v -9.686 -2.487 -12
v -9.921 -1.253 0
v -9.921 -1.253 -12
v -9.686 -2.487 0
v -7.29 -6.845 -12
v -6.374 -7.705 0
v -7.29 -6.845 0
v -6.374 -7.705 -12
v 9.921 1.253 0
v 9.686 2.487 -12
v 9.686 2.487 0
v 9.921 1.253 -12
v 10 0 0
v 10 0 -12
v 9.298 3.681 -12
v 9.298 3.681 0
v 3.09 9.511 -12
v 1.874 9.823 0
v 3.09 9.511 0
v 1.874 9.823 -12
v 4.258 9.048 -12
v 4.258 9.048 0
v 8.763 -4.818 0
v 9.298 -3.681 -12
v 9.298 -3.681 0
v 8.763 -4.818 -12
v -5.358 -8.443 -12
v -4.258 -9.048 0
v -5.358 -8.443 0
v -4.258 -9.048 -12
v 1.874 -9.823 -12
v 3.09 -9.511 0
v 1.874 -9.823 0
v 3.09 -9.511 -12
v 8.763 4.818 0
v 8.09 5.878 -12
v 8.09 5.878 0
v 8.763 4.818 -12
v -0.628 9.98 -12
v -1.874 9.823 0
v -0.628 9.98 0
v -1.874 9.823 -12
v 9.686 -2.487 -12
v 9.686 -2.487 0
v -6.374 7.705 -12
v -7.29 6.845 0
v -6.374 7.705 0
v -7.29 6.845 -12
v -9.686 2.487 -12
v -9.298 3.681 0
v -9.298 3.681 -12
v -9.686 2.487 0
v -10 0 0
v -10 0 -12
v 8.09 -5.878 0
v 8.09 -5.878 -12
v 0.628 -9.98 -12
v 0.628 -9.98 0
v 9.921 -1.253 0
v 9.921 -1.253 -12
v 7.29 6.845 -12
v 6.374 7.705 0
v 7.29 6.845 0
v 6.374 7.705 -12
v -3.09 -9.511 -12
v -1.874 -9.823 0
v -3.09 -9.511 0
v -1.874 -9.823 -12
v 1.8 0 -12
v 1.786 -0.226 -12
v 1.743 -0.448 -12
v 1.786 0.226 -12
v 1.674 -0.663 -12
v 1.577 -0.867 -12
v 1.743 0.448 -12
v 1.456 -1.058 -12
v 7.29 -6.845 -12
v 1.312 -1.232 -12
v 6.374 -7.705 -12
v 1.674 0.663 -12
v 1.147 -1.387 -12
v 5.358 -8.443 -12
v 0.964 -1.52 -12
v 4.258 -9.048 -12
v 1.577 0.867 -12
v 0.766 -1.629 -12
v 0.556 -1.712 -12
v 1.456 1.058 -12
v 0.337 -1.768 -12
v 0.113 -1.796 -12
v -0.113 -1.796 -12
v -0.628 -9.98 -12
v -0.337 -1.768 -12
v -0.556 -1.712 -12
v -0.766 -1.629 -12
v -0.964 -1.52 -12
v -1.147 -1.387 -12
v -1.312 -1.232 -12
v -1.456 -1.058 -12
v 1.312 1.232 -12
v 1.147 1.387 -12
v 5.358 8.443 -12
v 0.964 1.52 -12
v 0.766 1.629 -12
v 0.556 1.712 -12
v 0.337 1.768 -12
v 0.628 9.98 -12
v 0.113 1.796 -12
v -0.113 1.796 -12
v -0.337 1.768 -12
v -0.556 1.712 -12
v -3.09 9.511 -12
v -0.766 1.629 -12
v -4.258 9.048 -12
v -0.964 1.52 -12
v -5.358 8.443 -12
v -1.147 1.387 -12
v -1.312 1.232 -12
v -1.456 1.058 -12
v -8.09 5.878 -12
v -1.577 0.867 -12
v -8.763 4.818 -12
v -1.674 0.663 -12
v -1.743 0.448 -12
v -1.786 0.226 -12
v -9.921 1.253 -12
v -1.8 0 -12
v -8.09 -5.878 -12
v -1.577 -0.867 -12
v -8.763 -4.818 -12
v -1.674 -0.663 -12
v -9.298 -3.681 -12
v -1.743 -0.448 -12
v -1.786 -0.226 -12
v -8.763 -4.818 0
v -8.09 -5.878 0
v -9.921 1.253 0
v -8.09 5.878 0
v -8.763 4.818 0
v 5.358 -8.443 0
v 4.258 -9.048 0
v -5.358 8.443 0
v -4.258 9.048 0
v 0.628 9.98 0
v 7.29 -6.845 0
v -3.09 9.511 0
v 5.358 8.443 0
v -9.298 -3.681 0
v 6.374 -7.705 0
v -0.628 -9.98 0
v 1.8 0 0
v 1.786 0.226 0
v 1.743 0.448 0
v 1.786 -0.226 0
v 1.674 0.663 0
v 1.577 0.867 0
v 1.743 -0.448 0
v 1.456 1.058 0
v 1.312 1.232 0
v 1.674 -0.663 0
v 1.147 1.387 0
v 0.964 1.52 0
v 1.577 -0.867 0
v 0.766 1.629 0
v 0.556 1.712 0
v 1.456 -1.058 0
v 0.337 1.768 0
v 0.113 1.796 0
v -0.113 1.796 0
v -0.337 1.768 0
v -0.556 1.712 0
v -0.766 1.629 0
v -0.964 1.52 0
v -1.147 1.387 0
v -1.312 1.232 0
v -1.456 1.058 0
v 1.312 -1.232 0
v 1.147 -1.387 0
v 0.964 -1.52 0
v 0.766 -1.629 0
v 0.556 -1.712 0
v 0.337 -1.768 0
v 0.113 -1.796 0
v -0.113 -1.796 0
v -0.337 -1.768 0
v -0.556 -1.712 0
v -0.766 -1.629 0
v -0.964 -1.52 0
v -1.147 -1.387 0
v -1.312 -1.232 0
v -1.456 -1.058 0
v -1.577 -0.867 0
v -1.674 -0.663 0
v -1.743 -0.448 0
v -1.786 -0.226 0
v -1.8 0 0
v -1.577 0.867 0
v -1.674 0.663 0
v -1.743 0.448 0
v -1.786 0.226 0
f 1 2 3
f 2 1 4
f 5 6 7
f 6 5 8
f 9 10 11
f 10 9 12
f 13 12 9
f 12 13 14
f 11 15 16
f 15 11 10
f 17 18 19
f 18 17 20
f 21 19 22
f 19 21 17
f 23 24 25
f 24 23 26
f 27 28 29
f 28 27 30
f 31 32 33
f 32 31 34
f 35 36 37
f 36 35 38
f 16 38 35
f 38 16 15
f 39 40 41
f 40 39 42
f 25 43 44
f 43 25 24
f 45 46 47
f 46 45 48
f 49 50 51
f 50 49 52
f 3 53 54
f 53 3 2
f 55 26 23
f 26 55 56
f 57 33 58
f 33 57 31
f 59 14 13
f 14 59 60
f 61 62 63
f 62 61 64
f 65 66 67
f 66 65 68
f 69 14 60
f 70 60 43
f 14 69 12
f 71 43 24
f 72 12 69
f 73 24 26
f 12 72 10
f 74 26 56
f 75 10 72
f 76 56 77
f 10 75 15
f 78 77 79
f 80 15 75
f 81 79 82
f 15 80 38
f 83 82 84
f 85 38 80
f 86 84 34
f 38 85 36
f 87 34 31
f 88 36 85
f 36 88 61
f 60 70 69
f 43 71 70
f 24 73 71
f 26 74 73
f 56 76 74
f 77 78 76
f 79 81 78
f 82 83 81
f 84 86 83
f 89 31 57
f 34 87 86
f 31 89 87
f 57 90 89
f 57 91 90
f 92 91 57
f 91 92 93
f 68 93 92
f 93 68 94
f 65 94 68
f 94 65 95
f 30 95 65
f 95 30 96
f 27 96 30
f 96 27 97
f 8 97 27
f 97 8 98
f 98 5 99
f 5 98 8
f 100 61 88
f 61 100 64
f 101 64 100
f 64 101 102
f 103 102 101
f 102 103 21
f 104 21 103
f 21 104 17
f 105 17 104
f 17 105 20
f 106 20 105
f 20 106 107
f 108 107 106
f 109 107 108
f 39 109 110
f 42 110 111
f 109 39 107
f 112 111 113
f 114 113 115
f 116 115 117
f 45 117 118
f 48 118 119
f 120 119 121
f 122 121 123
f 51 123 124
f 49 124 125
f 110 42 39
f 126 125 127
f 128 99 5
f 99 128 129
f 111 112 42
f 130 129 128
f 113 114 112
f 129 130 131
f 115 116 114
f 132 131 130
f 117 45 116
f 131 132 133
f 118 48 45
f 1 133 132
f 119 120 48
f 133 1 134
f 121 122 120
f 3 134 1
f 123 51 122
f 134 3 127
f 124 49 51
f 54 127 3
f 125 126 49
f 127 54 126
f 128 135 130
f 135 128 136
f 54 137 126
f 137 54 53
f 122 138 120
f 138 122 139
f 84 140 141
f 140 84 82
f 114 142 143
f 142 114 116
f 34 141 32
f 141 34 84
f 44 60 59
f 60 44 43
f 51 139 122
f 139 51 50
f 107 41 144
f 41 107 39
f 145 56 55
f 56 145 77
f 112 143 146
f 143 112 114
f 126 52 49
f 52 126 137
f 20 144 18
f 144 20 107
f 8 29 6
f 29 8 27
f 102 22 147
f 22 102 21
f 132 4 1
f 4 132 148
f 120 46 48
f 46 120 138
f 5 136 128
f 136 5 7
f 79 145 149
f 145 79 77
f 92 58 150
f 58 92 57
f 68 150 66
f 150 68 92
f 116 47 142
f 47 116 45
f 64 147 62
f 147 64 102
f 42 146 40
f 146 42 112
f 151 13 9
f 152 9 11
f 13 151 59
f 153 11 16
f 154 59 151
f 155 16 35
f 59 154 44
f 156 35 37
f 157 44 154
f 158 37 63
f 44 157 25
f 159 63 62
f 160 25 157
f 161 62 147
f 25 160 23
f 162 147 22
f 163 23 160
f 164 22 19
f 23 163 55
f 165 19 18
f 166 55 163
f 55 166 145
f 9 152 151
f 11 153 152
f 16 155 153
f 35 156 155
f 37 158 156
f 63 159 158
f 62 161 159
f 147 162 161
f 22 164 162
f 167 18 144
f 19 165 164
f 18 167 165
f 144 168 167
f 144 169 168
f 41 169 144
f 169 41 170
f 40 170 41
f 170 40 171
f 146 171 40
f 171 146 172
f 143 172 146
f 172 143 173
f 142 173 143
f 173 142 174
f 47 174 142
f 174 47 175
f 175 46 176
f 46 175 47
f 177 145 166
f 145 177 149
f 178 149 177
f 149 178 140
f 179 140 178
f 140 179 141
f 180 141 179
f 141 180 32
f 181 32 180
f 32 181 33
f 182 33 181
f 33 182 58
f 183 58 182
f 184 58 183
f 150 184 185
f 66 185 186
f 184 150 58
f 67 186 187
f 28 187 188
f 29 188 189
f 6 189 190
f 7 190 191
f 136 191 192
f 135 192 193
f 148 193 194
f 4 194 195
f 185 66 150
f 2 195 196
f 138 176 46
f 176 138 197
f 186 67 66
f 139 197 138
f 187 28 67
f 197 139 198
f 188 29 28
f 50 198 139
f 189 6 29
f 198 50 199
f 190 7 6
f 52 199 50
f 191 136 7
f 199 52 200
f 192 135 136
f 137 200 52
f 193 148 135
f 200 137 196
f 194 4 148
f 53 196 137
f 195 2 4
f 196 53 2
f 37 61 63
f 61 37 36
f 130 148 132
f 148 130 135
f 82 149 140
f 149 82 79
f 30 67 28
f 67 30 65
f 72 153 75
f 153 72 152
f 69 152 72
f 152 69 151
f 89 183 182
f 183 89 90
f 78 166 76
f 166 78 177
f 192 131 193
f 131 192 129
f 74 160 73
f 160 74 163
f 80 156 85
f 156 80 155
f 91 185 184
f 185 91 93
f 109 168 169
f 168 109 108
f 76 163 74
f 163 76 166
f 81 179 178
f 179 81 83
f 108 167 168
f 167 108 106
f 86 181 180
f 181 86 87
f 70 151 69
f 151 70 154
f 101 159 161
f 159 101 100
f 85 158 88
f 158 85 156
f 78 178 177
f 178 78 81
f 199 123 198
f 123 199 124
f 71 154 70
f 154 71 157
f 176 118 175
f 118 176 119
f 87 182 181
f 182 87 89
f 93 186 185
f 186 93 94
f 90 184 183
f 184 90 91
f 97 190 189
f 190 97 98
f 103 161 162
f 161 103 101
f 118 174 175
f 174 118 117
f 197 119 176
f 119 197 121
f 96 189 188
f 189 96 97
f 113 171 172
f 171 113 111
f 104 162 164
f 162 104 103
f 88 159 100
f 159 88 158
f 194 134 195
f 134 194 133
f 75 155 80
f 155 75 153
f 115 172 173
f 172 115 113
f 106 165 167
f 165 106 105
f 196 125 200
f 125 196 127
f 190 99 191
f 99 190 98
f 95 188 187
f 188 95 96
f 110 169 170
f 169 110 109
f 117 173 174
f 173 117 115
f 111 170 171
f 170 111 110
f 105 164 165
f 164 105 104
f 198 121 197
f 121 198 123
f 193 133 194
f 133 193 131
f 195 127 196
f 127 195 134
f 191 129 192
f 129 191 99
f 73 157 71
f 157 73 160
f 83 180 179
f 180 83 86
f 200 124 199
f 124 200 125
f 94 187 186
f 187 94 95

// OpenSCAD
$fn = 50;


difference() {
	union() {
		translate(v = [0, 0, -12.0000000000]) {
			cylinder(h = 12, r = 10.0000000000);
		}
		cylinder(h = 0, r = 20.0000000000);
	}
	union() {
		#translate(v = [0, 0, -12]) {
			cylinder(h = 12, r = 1.8000000000);
		}
	}
}
